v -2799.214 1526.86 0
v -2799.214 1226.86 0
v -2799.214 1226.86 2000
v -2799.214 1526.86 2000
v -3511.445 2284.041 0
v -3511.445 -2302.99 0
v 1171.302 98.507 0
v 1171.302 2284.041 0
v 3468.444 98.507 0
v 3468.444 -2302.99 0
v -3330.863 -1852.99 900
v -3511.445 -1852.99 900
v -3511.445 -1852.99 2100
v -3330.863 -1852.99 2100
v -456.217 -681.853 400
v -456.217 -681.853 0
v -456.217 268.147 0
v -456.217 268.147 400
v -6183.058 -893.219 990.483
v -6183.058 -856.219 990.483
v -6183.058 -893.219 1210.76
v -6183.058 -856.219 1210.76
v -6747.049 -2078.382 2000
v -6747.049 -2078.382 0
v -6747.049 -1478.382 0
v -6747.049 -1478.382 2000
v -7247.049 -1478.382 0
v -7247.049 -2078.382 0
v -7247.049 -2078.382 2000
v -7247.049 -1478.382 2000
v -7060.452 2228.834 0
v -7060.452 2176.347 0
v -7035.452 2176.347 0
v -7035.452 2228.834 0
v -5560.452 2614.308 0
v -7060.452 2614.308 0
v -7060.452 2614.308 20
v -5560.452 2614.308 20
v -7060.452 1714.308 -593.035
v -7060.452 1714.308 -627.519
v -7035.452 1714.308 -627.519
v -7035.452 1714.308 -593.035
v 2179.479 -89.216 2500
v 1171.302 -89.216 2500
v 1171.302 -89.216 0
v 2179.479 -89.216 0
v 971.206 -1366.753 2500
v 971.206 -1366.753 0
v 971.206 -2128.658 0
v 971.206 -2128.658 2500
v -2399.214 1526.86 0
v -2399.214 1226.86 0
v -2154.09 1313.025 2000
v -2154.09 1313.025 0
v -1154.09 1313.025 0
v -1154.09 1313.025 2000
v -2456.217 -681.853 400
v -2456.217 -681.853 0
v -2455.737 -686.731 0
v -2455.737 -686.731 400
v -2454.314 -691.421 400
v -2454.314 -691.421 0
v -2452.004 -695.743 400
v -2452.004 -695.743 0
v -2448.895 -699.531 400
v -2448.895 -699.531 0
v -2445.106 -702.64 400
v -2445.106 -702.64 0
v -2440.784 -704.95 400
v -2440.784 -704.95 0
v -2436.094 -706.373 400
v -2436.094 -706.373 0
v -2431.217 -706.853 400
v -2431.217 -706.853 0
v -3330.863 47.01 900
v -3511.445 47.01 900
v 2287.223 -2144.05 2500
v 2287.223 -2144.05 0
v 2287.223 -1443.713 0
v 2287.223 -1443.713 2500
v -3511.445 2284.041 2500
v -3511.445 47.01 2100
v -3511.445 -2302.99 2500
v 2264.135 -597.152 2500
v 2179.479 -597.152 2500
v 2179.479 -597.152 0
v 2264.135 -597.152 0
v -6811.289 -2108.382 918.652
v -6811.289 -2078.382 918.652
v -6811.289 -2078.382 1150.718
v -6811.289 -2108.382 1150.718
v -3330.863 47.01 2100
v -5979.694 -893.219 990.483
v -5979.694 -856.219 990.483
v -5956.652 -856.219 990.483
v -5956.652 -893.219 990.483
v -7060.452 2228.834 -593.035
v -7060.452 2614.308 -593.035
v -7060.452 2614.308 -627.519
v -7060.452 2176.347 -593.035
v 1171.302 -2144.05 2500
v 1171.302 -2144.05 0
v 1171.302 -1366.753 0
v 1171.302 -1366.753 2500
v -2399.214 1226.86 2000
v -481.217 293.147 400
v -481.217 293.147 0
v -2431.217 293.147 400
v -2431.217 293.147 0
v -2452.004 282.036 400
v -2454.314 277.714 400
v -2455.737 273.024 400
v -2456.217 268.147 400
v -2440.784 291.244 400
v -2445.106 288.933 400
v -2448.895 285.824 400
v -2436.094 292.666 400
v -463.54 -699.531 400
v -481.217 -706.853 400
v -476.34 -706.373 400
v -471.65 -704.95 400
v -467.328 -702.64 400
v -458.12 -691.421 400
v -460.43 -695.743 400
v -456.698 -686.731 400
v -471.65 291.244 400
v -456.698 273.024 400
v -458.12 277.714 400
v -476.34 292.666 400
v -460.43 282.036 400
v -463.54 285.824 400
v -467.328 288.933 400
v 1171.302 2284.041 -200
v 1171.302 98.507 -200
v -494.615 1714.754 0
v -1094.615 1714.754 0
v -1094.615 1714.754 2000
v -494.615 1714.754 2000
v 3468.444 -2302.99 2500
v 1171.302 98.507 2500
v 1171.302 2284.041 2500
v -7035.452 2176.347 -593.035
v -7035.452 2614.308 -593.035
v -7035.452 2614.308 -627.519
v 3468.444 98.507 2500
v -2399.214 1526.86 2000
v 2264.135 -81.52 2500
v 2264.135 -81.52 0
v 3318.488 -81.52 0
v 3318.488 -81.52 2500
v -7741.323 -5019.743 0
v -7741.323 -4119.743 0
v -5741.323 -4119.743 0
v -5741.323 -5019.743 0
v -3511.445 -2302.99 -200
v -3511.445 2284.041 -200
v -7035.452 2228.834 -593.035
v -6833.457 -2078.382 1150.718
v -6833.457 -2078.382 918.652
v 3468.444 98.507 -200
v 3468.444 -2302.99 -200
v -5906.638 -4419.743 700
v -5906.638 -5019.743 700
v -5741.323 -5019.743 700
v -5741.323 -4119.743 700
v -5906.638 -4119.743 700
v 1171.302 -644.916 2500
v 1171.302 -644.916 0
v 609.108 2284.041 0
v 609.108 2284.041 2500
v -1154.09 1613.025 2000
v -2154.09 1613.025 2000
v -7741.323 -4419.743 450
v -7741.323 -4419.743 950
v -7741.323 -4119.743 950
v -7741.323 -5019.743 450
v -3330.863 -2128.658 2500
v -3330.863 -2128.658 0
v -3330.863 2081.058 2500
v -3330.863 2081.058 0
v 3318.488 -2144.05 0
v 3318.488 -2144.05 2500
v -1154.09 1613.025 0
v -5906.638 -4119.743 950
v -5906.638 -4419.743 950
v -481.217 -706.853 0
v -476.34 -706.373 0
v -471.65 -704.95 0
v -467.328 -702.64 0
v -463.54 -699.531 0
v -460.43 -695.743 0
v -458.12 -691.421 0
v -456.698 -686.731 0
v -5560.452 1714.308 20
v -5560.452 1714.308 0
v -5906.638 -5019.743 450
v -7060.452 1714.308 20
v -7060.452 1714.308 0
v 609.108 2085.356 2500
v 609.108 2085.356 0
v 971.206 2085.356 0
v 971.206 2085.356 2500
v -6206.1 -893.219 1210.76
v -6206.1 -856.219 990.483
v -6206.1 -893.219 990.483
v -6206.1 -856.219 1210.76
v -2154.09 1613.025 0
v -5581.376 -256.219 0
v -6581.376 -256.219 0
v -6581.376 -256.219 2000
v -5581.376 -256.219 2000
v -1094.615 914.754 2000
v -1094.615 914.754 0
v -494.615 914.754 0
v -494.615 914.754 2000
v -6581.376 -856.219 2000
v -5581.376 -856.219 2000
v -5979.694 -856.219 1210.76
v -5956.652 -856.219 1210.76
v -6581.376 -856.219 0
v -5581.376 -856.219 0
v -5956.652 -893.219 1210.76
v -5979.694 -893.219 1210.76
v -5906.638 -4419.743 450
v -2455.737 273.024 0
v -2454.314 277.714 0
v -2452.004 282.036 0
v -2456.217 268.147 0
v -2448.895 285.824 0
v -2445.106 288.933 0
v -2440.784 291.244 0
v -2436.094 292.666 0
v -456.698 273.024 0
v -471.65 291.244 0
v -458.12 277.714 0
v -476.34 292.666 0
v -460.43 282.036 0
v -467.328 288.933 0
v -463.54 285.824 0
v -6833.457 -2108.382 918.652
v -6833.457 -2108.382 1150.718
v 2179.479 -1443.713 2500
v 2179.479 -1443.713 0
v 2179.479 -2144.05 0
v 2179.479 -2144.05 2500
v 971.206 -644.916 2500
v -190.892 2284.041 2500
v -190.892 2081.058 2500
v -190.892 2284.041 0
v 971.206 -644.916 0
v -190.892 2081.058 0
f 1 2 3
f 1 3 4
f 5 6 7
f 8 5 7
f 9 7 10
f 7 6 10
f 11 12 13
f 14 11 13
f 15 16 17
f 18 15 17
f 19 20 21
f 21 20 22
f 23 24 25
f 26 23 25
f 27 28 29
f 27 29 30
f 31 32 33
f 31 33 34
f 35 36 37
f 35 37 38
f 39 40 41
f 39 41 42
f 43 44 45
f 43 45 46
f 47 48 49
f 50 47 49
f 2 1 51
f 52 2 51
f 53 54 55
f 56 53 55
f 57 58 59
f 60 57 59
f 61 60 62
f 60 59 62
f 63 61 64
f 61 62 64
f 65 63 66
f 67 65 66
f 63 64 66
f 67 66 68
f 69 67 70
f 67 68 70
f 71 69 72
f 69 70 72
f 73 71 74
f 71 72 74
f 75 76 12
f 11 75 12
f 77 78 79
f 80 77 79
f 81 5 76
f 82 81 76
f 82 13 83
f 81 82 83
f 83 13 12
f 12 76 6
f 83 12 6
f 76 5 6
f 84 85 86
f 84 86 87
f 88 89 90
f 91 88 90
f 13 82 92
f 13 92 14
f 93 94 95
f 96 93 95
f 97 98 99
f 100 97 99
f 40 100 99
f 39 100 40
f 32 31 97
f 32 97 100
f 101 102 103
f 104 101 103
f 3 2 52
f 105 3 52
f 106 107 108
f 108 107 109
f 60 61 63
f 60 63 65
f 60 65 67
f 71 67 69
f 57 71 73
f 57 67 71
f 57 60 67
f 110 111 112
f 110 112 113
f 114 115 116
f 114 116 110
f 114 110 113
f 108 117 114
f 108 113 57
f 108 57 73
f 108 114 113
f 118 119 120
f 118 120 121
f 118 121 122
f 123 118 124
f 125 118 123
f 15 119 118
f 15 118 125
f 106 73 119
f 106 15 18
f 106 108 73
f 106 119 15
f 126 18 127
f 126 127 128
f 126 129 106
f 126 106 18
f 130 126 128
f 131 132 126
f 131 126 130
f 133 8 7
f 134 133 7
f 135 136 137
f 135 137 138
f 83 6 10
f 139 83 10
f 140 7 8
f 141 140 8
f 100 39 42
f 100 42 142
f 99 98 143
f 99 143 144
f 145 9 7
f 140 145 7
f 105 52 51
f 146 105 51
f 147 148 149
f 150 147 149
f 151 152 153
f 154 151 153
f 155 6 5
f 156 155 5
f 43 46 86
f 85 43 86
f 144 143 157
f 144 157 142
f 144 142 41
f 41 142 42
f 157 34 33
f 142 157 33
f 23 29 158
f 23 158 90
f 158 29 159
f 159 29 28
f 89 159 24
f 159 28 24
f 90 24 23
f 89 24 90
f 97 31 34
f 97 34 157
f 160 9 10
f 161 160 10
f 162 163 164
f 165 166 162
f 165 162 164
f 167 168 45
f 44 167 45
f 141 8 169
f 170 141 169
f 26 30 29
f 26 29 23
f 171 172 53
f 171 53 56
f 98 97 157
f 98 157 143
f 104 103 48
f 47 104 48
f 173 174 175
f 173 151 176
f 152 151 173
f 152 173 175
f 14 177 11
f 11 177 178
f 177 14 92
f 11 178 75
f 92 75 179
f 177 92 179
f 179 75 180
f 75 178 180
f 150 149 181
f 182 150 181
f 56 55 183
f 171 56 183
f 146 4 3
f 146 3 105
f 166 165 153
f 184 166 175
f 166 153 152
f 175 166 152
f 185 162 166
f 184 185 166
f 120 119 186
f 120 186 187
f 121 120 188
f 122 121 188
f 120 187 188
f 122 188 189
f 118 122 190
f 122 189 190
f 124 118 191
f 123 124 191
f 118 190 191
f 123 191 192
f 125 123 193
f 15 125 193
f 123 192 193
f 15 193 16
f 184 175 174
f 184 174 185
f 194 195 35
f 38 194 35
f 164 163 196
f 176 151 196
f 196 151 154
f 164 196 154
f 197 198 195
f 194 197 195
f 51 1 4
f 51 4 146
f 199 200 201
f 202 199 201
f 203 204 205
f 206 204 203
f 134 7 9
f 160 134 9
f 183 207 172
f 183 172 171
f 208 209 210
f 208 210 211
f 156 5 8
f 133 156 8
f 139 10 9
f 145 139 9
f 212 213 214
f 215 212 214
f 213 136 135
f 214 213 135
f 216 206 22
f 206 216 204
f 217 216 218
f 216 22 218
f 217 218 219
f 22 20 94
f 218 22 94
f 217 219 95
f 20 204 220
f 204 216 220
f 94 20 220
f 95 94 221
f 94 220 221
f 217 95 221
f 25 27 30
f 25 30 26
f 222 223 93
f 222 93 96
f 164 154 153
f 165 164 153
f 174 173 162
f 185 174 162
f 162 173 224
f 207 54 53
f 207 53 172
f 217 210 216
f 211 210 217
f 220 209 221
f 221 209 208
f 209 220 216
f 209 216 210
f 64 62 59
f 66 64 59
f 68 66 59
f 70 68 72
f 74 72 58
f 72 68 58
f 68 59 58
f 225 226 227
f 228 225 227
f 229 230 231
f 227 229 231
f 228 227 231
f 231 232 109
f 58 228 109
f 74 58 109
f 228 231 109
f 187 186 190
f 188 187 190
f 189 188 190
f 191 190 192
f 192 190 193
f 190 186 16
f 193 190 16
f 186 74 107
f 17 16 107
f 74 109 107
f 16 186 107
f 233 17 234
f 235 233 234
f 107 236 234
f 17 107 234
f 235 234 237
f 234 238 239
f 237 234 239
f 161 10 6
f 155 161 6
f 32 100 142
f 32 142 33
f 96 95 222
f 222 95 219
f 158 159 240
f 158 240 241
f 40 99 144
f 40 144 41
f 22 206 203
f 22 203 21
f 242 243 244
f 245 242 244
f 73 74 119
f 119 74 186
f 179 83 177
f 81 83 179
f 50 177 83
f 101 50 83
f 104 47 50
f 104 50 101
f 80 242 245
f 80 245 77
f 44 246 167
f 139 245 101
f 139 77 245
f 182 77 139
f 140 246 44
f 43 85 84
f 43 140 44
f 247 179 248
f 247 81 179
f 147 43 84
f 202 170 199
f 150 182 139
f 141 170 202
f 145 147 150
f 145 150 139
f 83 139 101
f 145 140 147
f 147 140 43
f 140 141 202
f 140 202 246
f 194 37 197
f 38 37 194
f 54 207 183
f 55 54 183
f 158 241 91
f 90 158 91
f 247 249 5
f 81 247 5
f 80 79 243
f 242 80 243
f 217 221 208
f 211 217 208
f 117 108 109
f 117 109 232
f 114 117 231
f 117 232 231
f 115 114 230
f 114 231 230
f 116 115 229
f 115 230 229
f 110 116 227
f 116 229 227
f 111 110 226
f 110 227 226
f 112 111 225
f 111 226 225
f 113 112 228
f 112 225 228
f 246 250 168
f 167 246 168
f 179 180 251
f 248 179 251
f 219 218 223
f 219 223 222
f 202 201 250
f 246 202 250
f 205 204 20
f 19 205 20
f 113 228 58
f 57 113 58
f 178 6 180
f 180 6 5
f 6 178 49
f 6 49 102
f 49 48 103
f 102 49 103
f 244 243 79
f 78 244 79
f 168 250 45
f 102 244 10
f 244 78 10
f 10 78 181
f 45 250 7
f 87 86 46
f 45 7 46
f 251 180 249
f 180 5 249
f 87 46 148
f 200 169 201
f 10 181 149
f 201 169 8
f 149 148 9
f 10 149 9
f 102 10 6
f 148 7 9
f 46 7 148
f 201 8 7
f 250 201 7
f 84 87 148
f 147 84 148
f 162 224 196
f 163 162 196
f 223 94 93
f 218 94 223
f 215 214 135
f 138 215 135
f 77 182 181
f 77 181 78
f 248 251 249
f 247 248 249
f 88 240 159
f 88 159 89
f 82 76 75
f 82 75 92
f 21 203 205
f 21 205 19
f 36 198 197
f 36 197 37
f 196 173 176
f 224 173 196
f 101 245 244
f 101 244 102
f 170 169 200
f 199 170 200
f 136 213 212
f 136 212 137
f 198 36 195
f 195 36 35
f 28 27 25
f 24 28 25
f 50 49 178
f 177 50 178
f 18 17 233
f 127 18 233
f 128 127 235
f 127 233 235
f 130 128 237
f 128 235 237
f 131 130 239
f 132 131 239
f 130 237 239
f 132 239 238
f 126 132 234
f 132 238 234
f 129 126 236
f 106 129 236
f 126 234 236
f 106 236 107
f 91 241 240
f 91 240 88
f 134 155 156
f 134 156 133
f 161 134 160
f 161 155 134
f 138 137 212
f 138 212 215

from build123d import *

# Parameters (mm, degrees)
F2_DEPTH  = 2500
F3_W      = 1900
F3_H      = 1200
F4_DEPTH  = 180.582437
F1_W      = 600
F1_H      = 800
F5_DEPTH  = 2000
F7_DEPTH  = 400
F8_W      = 400
F8_H      = 300
F9_DEPTH  = 2000
F10_W     = 1000
F10_H     = 300
F11_DEPTH = 2000
F13_DEPTH = 200
F14_W     = 1500
F14_H     = 900
F15_DEPTH = 20
F17_DEPTH = 25
F19_W     = 500
F19_H     = 600
F20_DEPTH = 2000
F18_W     = 1000
F18_H     = 600
F21_DEPTH = 2000
F22_W     = 23.042202
F22_H     = 220.27713
F23_DEPTH = 37
F24_W     = 22.167683
F24_H     = 232.065857
F25_DEPTH = 30
F26_W     = 2000
F26_H     = 900
F27_DEPTH = 450
F28_W     = 1834.685802
F28_H     = 300
F29_DEPTH = 500
F31_DEPTH = 250


with BuildPart() as f2:
    # F0 (on Top) → F2 (new body)
    with BuildSketch(Plane.XY):
        Polygon((-3330.862555, 2081.05841), (-190.891501, 2081.05841), (-190.891501, 2284.041171), (-3511.444992, 2284.041171), (-3511.444992, -2302.99005), (3468.443899, -2302.99005), (3468.443899, 98.506558), (1171.301963, 98.506558), (1171.301963, 2284.041171), (609.108499, 2284.041171), (609.108499, 2085.356188), (971.205715, 2085.356188), (971.205715, -644.9161), (1171.301963, -644.9161), (1171.301963, -89.215858), (2179.478835, -89.215858), (2179.478835, -597.1524), (2264.134895, -597.1524), (2264.134895, -81.519827), (3318.488064, -81.519827), (3318.488064, -2144.049868), (2287.22299, -2144.049868), (2287.22299, -1443.713147), (2179.478835, -1443.713147), (2179.478835, -2144.049868), (1171.301963, -2144.049868), (1171.301963, -1366.753262), (971.205715, -1366.753262), (971.205715, -2128.658092), (-3330.862555, -2128.658092), align=None)
    extrude(amount=F2_DEPTH)

    # F3 (on face) → F4 (cut, through all)
    with BuildSketch(Plane(origin=(-3511.444992, 0, 0), x_dir=(0, -1, 0), z_dir=(-1, 0, 0))):
        with Locations((902.99005, 1500)):
            Rectangle(F3_W, F3_H)
    extrude(amount=-F4_DEPTH, mode=Mode.SUBTRACT)


with BuildPart() as f5:
    # F1 (on Top) → F5 (new body)
    with BuildSketch(Plane.XY):
        with Locations((-794.615459, 1314.753842)):
            Rectangle(F1_W, F1_H)
    extrude(amount=F5_DEPTH)


with BuildPart() as f7:
    # F6 (on Top) → F7 (new body)
    with BuildSketch(Plane.XY):
        with BuildLine():
            ThreePointArc((-456.21717, 268.146557), (-463.5395, 285.824226), (-481.21717, 293.146557))
            Line((-481.21717, 293.146557), (-2431.21717, 293.146557))
            ThreePointArc((-2431.21717, 293.146557), (-2448.894839, 285.824226), (-2456.21717, 268.146557))
            Line((-2456.21717, 268.146557), (-2456.21717, -681.853443))
            ThreePointArc((-2456.21717, -681.853443), (-2448.894839, -699.531113), (-2431.21717, -706.853443))
            Line((-2431.21717, -706.853443), (-481.21717, -706.853443))
            ThreePointArc((-481.21717, -706.853443), (-463.5395, -699.531113), (-456.21717, -681.853443))
            Line((-456.21717, -681.853443), (-456.21717, 268.146557))
        make_face()
    extrude(amount=F7_DEPTH)


with BuildPart() as f9:
    # F8 (on Top) → F9 (new body)
    with BuildSketch(Plane.XY):
        with Locations((-2599.213827, 1376.860023)):
            Rectangle(F8_W, F8_H)
    extrude(amount=F9_DEPTH)


with BuildPart() as f11:
    # F10 (on Top) → F11 (new body)
    with BuildSketch(Plane.XY):
        with Locations((-1654.090345, 1463.02452)):
            Rectangle(F10_W, F10_H)
    extrude(amount=F11_DEPTH)


with BuildPart() as f13:
    # F12 (on face) → F13 (new body)
    with BuildSketch(Plane(origin=(0, 0, 0), x_dir=(1, 0, 0), z_dir=(0, 0, -1))):
        Polygon((3468.443899, 2302.99005), (-3511.444992, 2302.99005), (-3511.444992, -2284.041171), (1171.301963, -2284.041171), (1171.301963, -98.506558), (3468.443899, -98.506558), align=None)
    extrude(amount=F13_DEPTH)


with BuildPart() as f15:
    # F14 (on Top) → F15 (new body)
    with BuildSketch(Plane.XY):
        with Locations((-6310.451746, 2164.307533)):
            Rectangle(F14_W, F14_H)
    extrude(amount=F15_DEPTH)


with BuildPart() as f17:
    # F16 (on face) → F17 (new body)
    with BuildSketch(Plane(origin=(-7060.451746, 0, 0), x_dir=(0, -1, 0), z_dir=(-1, 0, 0))):
        Polygon((-2176.347256, 0), (-2228.834152, 0), (-2228.834152, -593.034565), (-2614.307533, -593.034565), (-2614.307533, -627.51931), (-1714.307533, -627.51931), (-1714.307533, -593.034565), (-2176.347256, -593.034565), align=None)
    extrude(amount=-F17_DEPTH)


with BuildPart() as f20:
    # F19 (on Top) → F20 (new body)
    with BuildSketch(Plane.XY):
        with Locations((-6997.049062, -1778.381586)):
            Rectangle(F19_W, F19_H)
    extrude(amount=F20_DEPTH)

    # F24 (on face) → F25 (join)
    with BuildSketch(Plane.XZ.offset(2078.381586)):
        with Locations((-6822.373151, 1034.685045)):
            Rectangle(F24_W, F24_H)
    extrude(amount=F25_DEPTH)


with BuildPart() as f21:
    # F18 (on Top) → F21 (new body)
    with BuildSketch(Plane.XY):
        with Locations((-6081.376154, -556.219339)):
            Rectangle(F18_W, F18_H)
    extrude(amount=F21_DEPTH)

    # F22 (on face) → F23 (join)
    with BuildSketch(Plane.XZ.offset(856.219339)):
        with Locations((-6194.579363, 1100.621432)):
            Rectangle(F22_W, F22_H)
        with Locations((-5968.172945, 1100.621432)):
            Rectangle(F22_W, F22_H)
    extrude(amount=F23_DEPTH)


with BuildPart() as f27:
    # F26 (on Top) → F27 (new body)
    with BuildSketch(Plane.XY):
        with Locations((-6741.323471, -4569.742512)):
            Rectangle(F26_W, F26_H)
    extrude(amount=F27_DEPTH)

    # F28 (on face) → F29 (join)
    with BuildSketch(Plane.XY.offset(450)):
        with Locations((-6823.98057, -4269.742512)):
            Rectangle(F28_W, F28_H)
    extrude(amount=F29_DEPTH)

    # F30 (on face) → F31 (join)
    with BuildSketch(Plane.XY.offset(450)):
        Polygon((-5741.323471, -4119.742512), (-5906.637669, -4119.742512), (-5906.637669, -4419.742512), (-5906.637669, -5019.742512), (-5741.323471, -5019.742512), align=None)
    extrude(amount=F31_DEPTH)


solid = Compound([f2.part, f5.part, f7.part, f9.part, f11.part, f13.part, f15.part, f17.part, f20.part, f21.part, f27.part])
